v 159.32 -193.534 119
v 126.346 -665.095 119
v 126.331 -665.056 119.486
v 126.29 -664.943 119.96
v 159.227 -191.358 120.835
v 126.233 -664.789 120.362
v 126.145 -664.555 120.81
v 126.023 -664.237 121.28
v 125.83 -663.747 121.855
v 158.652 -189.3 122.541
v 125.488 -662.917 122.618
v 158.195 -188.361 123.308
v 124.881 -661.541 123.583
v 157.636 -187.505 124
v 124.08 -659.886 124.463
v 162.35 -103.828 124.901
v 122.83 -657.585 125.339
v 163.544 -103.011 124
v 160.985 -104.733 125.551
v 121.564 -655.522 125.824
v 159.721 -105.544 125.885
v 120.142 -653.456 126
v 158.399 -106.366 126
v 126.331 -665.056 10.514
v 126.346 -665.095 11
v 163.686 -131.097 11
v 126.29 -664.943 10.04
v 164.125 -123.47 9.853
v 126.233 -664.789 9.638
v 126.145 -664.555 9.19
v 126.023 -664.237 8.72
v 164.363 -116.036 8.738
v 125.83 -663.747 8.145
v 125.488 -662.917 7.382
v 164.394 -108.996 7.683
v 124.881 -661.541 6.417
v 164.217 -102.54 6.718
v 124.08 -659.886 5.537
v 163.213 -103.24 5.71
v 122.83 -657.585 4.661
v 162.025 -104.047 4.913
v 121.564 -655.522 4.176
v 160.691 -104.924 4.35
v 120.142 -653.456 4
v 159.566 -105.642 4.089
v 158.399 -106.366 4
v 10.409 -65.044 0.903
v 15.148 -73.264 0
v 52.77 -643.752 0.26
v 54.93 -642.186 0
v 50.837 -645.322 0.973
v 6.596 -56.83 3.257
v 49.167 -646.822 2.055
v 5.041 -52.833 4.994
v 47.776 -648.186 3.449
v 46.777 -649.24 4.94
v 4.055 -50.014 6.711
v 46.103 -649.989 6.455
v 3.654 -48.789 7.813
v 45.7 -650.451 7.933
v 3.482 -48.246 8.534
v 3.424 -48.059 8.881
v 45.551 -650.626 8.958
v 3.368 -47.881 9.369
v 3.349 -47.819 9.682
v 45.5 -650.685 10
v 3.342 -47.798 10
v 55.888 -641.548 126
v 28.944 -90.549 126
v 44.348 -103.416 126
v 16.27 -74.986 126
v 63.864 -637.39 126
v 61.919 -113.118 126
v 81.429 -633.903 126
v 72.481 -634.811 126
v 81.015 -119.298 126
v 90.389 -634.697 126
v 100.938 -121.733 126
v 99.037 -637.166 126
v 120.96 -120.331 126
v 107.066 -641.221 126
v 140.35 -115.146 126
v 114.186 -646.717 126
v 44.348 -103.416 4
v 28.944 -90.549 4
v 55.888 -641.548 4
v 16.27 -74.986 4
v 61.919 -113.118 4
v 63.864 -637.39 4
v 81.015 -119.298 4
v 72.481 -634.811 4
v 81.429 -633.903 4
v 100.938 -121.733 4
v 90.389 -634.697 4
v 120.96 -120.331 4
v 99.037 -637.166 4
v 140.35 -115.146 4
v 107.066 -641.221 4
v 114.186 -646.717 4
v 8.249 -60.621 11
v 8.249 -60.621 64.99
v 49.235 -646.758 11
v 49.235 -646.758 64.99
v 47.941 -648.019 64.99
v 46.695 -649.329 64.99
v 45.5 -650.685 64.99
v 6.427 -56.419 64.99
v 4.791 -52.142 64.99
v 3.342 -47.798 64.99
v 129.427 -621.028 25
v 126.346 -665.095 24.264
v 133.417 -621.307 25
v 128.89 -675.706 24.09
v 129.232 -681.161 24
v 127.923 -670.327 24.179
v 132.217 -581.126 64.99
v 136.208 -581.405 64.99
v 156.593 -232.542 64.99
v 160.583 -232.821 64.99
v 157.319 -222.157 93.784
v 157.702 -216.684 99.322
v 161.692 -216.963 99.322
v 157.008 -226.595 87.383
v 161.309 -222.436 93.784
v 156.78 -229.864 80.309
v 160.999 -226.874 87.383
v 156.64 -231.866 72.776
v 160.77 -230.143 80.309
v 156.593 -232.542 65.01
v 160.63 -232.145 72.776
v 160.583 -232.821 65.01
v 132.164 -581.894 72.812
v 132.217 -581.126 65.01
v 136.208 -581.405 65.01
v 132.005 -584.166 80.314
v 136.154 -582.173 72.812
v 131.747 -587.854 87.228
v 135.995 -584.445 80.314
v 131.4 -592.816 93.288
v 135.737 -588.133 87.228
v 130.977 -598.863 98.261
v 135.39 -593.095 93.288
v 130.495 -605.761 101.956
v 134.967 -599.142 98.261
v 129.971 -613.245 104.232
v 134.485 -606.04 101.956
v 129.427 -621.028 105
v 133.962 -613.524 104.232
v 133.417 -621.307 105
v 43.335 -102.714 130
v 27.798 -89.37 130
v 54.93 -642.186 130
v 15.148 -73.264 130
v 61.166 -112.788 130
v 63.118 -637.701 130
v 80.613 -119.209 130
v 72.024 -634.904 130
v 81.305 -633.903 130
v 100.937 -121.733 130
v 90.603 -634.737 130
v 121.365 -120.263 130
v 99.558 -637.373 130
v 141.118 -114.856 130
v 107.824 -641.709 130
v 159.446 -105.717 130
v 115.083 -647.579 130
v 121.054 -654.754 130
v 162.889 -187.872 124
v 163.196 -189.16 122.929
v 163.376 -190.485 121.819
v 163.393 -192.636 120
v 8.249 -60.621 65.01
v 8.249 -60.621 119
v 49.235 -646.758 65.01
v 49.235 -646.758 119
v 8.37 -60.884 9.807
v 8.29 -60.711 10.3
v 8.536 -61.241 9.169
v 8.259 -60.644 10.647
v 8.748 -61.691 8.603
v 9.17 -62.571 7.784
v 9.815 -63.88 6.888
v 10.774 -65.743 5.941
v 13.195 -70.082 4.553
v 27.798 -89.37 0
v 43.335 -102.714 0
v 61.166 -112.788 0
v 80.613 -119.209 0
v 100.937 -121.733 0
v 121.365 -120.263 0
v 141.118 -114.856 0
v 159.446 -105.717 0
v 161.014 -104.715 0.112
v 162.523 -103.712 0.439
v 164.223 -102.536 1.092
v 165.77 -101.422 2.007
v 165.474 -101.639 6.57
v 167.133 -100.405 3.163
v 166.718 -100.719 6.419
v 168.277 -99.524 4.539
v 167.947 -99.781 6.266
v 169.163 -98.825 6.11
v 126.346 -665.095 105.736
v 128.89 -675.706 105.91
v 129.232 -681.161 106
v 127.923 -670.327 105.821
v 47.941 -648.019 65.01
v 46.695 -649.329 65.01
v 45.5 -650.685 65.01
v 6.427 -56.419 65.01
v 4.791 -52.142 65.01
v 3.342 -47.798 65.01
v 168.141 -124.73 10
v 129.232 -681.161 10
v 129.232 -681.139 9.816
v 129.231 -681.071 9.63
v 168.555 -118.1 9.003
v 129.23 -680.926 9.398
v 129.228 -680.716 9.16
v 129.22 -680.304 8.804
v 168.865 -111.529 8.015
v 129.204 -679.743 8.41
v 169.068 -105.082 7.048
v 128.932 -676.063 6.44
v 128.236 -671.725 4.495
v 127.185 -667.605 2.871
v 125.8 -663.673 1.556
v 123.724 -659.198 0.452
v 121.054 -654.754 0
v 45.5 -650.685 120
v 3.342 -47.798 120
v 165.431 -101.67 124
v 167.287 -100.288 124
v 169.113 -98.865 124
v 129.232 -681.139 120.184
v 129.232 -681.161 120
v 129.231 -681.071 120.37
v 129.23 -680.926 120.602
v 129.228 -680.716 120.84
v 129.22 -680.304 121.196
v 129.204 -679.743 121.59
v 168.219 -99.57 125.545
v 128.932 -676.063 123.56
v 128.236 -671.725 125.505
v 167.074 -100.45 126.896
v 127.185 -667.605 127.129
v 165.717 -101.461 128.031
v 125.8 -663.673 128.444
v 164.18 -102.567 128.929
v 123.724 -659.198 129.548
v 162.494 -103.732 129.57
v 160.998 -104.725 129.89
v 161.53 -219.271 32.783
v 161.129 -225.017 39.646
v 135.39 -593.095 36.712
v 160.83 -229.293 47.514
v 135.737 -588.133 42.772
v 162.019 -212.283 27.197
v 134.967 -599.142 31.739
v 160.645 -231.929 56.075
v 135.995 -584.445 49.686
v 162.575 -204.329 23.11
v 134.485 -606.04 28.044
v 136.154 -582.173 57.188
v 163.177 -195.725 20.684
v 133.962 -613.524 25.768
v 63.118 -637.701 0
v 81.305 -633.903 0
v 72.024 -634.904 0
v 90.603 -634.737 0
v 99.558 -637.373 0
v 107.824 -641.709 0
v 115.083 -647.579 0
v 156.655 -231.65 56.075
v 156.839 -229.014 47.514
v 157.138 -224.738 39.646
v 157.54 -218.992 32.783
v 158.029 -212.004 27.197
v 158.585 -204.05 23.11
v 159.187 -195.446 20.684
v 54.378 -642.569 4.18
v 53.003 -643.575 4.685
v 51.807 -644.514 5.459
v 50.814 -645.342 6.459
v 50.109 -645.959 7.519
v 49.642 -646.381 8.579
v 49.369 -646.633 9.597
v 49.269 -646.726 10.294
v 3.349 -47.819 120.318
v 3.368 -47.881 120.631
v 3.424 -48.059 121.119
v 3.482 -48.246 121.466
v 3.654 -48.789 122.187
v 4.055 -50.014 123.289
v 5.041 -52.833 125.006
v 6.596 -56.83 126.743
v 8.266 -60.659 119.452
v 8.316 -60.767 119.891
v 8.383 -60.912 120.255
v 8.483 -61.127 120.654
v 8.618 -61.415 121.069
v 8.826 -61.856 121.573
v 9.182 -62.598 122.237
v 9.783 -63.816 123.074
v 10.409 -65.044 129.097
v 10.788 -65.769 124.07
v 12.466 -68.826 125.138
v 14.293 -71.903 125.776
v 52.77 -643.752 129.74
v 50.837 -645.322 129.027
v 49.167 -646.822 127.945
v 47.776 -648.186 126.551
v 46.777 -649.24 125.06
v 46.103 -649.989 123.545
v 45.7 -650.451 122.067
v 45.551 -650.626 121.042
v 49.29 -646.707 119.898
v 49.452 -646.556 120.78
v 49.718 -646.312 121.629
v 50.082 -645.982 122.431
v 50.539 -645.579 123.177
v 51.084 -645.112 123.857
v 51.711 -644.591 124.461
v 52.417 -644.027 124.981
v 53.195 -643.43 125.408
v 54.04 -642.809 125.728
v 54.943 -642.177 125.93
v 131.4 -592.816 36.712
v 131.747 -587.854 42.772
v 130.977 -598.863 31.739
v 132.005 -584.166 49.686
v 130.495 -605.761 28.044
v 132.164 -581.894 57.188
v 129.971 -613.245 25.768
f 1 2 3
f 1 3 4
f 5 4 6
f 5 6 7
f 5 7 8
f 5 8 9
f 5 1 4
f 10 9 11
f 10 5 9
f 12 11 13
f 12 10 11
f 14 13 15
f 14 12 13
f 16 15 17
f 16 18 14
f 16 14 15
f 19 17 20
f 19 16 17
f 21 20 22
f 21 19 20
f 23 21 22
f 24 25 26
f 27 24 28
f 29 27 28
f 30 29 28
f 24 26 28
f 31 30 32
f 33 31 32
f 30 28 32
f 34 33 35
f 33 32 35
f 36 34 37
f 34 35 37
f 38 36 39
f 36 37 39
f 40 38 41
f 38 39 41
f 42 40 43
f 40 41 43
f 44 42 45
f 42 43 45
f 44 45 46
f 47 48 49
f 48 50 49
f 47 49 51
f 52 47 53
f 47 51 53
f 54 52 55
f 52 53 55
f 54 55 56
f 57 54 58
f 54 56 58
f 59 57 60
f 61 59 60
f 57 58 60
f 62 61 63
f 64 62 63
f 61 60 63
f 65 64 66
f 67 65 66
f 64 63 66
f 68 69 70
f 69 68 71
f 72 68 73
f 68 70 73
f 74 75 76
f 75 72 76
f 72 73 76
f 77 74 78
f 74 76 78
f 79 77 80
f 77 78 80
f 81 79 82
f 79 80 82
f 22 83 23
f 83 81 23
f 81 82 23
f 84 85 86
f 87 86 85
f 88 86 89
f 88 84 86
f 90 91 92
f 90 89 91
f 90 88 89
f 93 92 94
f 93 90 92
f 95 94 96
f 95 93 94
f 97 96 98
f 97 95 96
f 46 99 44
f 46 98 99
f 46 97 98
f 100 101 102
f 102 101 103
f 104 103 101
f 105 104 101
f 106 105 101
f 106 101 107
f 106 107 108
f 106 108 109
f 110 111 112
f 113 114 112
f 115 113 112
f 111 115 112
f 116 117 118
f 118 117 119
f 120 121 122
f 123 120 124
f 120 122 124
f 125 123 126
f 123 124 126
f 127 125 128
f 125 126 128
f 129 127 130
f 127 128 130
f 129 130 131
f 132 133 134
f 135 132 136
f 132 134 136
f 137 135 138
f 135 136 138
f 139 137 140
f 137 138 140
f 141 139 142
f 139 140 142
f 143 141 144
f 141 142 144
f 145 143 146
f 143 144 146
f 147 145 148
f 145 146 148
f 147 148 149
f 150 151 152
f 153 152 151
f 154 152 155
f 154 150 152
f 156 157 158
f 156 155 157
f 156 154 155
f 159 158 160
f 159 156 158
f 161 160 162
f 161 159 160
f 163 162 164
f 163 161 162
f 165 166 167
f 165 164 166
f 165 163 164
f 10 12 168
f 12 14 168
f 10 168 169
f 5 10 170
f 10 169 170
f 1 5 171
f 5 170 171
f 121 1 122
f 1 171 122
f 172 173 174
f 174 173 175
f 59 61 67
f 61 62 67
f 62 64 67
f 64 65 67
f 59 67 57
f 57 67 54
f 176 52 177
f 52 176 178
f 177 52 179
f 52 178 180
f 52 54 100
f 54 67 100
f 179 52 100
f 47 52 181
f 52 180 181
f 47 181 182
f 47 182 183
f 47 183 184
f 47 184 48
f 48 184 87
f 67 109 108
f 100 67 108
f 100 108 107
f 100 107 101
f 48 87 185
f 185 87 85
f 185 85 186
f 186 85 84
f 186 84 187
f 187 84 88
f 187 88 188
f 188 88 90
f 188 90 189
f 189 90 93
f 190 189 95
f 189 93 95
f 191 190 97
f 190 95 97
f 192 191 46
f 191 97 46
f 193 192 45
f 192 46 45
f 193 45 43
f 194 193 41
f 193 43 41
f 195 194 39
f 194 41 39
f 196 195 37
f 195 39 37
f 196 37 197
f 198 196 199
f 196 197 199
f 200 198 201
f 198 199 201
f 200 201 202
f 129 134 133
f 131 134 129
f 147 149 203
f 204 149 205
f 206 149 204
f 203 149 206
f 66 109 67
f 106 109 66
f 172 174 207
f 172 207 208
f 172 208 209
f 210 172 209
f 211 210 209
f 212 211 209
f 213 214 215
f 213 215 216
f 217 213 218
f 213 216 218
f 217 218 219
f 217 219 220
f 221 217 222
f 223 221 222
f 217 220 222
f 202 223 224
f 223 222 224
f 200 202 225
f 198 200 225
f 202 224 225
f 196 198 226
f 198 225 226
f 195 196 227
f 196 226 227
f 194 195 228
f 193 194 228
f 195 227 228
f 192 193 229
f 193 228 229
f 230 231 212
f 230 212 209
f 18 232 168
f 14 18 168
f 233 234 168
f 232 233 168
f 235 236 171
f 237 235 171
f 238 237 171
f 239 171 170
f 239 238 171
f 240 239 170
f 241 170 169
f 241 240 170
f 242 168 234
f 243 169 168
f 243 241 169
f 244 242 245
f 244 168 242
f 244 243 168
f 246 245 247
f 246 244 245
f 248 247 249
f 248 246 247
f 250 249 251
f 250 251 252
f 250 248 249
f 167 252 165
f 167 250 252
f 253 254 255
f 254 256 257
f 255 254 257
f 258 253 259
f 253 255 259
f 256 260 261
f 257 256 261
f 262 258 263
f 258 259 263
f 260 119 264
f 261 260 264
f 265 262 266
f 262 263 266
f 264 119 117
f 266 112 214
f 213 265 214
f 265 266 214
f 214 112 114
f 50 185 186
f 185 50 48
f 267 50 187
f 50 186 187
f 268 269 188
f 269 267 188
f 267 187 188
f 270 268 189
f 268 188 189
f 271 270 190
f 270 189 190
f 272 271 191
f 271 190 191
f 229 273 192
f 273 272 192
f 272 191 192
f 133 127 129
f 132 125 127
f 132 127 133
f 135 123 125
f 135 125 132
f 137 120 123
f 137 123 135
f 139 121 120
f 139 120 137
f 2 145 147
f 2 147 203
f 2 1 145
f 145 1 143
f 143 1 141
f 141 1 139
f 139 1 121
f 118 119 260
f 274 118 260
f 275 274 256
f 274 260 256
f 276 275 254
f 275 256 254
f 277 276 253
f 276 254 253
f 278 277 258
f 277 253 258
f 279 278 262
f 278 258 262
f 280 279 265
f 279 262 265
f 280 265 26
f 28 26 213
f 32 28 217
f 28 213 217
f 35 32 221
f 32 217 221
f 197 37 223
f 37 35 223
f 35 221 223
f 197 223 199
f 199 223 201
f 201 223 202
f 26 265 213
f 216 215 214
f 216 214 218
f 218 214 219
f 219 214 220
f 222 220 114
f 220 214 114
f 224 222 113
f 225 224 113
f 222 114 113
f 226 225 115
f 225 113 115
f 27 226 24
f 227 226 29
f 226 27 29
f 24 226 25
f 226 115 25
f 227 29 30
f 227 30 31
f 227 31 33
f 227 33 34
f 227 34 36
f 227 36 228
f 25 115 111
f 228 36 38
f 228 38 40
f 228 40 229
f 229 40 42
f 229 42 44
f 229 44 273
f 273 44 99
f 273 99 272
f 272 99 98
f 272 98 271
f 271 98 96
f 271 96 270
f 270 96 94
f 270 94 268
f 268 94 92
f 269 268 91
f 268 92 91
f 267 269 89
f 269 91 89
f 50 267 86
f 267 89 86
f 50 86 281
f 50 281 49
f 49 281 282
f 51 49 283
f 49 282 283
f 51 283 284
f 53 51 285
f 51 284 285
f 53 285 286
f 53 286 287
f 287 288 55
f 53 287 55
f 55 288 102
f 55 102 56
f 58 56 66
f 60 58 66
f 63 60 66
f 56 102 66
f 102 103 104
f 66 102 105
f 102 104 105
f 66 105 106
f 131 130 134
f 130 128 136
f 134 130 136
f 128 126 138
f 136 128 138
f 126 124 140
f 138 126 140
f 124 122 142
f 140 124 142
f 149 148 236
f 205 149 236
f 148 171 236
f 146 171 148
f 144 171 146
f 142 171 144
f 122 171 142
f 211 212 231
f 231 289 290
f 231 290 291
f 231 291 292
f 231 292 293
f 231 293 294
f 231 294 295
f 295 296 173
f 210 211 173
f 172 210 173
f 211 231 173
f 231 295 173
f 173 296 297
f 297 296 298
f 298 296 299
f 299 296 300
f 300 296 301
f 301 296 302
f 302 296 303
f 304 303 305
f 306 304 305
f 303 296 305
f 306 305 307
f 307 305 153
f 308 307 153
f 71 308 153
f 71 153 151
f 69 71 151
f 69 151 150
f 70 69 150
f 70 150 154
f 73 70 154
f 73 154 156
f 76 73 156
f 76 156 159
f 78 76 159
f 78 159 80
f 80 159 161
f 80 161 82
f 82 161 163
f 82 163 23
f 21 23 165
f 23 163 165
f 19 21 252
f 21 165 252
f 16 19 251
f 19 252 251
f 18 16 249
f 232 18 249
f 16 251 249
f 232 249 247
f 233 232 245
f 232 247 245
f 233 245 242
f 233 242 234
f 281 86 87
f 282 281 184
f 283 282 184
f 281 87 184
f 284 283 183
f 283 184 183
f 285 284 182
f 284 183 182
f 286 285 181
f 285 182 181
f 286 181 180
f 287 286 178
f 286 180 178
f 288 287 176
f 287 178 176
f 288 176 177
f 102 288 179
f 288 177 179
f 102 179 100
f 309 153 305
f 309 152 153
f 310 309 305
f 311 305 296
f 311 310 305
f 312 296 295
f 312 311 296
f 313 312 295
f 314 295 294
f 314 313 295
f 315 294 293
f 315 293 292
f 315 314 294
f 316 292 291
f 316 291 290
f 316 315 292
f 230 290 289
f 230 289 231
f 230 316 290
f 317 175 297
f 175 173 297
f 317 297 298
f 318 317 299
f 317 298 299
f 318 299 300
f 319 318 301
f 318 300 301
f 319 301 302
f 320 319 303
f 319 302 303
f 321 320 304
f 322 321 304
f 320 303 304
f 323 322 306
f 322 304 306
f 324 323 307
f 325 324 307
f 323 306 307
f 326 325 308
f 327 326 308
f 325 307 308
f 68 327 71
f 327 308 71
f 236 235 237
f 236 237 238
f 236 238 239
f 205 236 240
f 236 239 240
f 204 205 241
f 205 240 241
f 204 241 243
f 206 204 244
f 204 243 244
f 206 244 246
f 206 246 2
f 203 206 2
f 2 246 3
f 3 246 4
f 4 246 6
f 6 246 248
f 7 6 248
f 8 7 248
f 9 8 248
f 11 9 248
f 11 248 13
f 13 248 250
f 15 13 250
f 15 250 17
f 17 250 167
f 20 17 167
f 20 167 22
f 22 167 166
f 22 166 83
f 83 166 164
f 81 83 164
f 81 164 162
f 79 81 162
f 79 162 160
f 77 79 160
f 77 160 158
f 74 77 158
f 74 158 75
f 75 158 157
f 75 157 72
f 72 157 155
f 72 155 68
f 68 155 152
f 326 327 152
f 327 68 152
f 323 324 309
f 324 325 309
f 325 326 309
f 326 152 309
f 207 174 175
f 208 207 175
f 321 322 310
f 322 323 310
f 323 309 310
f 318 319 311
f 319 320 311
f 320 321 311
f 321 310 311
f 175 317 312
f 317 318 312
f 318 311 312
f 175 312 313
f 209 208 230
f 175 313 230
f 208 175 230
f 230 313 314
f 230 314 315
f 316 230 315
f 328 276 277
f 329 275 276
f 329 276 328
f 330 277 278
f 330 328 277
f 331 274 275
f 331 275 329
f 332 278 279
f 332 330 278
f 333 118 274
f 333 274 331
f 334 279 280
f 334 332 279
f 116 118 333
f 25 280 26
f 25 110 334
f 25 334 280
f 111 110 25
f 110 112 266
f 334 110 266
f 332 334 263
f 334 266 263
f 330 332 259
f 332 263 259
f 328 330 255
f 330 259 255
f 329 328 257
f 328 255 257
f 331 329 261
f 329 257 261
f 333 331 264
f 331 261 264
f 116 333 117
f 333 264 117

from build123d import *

# Parameters (mm, degrees)
EXTRUDE_1_DEPTH      = 130
CUT_EXTRUDE_2_DEPTH  = 150
SHELL_2_T            = -4
SKETCH_5_R           = 105
CUT_EXTRUDE_3_DEPTH  = 160
CUT_EXTRUDE_12_DEPTH = 19
SKETCH_7_R           = 47.5
CUT_EXTRUDE_16_DEPTH = 714.989159073
FILLET_8_R           = 10
FILLET_9_R           = 10
CUT_EXTRUDE_21_DEPTH = 41
FILLET_10_R          = 7
SKETCH_37_W          = 0.02
SKETCH_37_H          = 620.838123288
CUT_EXTRUDE_22_DEPTH = 703.906153721


with BuildPart() as part:
    # 草图1 → 拉伸1 (new body)
    with BuildSketch(Plane.XY):
        Polygon((0, 0), (0, -634.124605937), (170, -695.999545762), (170, -98.149545762), align=None)
    extrude(amount=EXTRUDE_1_DEPTH)

    # 草图4 → 切除-拉伸2 (cut)
    with BuildSketch(Plane.XY.offset(130)):
        Polygon((0, 0), (45.500354239, -650.685380528), (0, -634.124605937), align=None)
        Polygon((170, -98.149545762), (129.23185683, -681.161155142), (170, -695.999545762), align=None)
    extrude(amount=-CUT_EXTRUDE_2_DEPTH, mode=Mode.SUBTRACT)

    # 抽壳2
    shell_2_openings = [part.faces().sort_by_distance(p)[0] for p in [
        (87.366105534, -665.923267835, 65),
        (85, -49.074772881, 65),
    ]]
    offset(amount=SHELL_2_T, openings=shell_2_openings, kind=Kind.INTERSECTION)

    # 草图5 → 切除-拉伸3 (cut)
    with BuildSketch(Plane.XY.offset(130)):
        with Locations((103.652524405, -16.767652923)):
            Circle(SKETCH_5_R)
    extrude(amount=-CUT_EXTRUDE_3_DEPTH, mode=Mode.SUBTRACT)

    # 草图23 → 切除-拉伸12 (cut)
    with BuildSketch(Plane(origin=(176.002674164, -12.307305898, 0), x_dir=(0, 0, -1), z_dir=(0.9975640502598249, -0.06975647374411818, 0))):
        with BuildLine():
            Line((-124, -86.051857865), (-124, -176.051857865))
            Line((-124, -176.051857865), (-99.322033898, -205.155087739))
            ThreePointArc((-99.322033898, -205.155087739), (-53.240849438, -219.488275513), (-20.683651114, -183.86602586))
            Line((-20.683651114, -183.86602586), (-6, -86.051857865))
            Line((-6, -86.051857865), (-124, -86.051857865))
        make_face()
    extrude(amount=-CUT_EXTRUDE_12_DEPTH, mode=Mode.SUBTRACT)

    # 草图7 → 切除-拉伸16 (cut, through all)
    with BuildSketch(Plane.XY.offset(130)):
        with Locations((81.732465234, -681.401567349)):
            Circle(SKETCH_7_R)
    extrude(amount=-CUT_EXTRUDE_16_DEPTH, mode=Mode.SUBTRACT)

    # 圆角8
    fillet_8_edges = [part.edges().sort_by_distance(p)[0] for p in [
        (24.421349867, -349.241573986, 0),
        (149.615928415, -389.655350452, 0),
    ]]
    fillet(fillet_8_edges, radius=FILLET_8_R)

    # 圆角9
    fillet_9_edges = [part.edges().sort_by_distance(p)[0] for p in [
        (24.421349867, -349.241573986, 130),
        (149.615928415, -389.655350452, 130),
    ]]
    fillet(fillet_9_edges, radius=FILLET_9_R)

    # 草图36 → 切除-拉伸21 (cut)
    with BuildSketch(Plane(origin=(176.002674164, -12.307305898, 0), x_dir=(0, 0, -1), z_dir=(0.9975640502598248, -0.06975647374411817, 0))):
        with BuildLine():
            Line((-105, -610.487122175), (-106, -670.487122175))
            Line((-106, -670.487122175), (-24, -670.487122175))
            Line((-24, -670.487122175), (-25, -610.487122175))
            ThreePointArc((-25, -610.487122175), (-65, -570.487122175), (-105, -610.487122175))
        make_face()
    extrude(amount=-CUT_EXTRUDE_21_DEPTH, mode=Mode.SUBTRACT)

    # 圆角10
    fillet_10_edges = [part.edges().sort_by_distance(p)[0] for p in [
        (146.053243557, -383.261769485, 4),
        (28.742143608, -353.68945513, 4),
        (146.053243557, -383.261769485, 126),
        (28.742143608, -353.68945513, 126),
    ]]
    fillet(fillet_10_edges, radius=FILLET_10_R)

    # 草图37 → 切除-拉伸22 (cut, through all)
    with BuildSketch(Plane(origin=(176.002674164, -12.307305898, 0), x_dir=(0, 0, -1), z_dir=(0.9975640502598248, -0.06975647374411821, 0))):
        with Locations((-65, -357.867245893)):
            Rectangle(SKETCH_37_W, SKETCH_37_H)
    extrude(amount=-CUT_EXTRUDE_22_DEPTH, mode=Mode.SUBTRACT)


with BuildPart() as cut_extrude_22_piece_1:
    # of the separate pieces the step leaves, piece 1, a body of its own (cut_extrude_22_pieces)
    add(part.part.solids().sort_by_distance((126.345578519, -665.094509888, 11))[0])


with BuildPart() as cut_extrude_22_piece_2:
    # of the separate pieces the step leaves, piece 2, a body of its own (cut_extrude_22_pieces)
    add(part.part.solids().sort_by_distance((49.235473677, -646.75772894, 65.01))[0])


solid = Compound([cut_extrude_22_piece_1.part, cut_extrude_22_piece_2.part])
